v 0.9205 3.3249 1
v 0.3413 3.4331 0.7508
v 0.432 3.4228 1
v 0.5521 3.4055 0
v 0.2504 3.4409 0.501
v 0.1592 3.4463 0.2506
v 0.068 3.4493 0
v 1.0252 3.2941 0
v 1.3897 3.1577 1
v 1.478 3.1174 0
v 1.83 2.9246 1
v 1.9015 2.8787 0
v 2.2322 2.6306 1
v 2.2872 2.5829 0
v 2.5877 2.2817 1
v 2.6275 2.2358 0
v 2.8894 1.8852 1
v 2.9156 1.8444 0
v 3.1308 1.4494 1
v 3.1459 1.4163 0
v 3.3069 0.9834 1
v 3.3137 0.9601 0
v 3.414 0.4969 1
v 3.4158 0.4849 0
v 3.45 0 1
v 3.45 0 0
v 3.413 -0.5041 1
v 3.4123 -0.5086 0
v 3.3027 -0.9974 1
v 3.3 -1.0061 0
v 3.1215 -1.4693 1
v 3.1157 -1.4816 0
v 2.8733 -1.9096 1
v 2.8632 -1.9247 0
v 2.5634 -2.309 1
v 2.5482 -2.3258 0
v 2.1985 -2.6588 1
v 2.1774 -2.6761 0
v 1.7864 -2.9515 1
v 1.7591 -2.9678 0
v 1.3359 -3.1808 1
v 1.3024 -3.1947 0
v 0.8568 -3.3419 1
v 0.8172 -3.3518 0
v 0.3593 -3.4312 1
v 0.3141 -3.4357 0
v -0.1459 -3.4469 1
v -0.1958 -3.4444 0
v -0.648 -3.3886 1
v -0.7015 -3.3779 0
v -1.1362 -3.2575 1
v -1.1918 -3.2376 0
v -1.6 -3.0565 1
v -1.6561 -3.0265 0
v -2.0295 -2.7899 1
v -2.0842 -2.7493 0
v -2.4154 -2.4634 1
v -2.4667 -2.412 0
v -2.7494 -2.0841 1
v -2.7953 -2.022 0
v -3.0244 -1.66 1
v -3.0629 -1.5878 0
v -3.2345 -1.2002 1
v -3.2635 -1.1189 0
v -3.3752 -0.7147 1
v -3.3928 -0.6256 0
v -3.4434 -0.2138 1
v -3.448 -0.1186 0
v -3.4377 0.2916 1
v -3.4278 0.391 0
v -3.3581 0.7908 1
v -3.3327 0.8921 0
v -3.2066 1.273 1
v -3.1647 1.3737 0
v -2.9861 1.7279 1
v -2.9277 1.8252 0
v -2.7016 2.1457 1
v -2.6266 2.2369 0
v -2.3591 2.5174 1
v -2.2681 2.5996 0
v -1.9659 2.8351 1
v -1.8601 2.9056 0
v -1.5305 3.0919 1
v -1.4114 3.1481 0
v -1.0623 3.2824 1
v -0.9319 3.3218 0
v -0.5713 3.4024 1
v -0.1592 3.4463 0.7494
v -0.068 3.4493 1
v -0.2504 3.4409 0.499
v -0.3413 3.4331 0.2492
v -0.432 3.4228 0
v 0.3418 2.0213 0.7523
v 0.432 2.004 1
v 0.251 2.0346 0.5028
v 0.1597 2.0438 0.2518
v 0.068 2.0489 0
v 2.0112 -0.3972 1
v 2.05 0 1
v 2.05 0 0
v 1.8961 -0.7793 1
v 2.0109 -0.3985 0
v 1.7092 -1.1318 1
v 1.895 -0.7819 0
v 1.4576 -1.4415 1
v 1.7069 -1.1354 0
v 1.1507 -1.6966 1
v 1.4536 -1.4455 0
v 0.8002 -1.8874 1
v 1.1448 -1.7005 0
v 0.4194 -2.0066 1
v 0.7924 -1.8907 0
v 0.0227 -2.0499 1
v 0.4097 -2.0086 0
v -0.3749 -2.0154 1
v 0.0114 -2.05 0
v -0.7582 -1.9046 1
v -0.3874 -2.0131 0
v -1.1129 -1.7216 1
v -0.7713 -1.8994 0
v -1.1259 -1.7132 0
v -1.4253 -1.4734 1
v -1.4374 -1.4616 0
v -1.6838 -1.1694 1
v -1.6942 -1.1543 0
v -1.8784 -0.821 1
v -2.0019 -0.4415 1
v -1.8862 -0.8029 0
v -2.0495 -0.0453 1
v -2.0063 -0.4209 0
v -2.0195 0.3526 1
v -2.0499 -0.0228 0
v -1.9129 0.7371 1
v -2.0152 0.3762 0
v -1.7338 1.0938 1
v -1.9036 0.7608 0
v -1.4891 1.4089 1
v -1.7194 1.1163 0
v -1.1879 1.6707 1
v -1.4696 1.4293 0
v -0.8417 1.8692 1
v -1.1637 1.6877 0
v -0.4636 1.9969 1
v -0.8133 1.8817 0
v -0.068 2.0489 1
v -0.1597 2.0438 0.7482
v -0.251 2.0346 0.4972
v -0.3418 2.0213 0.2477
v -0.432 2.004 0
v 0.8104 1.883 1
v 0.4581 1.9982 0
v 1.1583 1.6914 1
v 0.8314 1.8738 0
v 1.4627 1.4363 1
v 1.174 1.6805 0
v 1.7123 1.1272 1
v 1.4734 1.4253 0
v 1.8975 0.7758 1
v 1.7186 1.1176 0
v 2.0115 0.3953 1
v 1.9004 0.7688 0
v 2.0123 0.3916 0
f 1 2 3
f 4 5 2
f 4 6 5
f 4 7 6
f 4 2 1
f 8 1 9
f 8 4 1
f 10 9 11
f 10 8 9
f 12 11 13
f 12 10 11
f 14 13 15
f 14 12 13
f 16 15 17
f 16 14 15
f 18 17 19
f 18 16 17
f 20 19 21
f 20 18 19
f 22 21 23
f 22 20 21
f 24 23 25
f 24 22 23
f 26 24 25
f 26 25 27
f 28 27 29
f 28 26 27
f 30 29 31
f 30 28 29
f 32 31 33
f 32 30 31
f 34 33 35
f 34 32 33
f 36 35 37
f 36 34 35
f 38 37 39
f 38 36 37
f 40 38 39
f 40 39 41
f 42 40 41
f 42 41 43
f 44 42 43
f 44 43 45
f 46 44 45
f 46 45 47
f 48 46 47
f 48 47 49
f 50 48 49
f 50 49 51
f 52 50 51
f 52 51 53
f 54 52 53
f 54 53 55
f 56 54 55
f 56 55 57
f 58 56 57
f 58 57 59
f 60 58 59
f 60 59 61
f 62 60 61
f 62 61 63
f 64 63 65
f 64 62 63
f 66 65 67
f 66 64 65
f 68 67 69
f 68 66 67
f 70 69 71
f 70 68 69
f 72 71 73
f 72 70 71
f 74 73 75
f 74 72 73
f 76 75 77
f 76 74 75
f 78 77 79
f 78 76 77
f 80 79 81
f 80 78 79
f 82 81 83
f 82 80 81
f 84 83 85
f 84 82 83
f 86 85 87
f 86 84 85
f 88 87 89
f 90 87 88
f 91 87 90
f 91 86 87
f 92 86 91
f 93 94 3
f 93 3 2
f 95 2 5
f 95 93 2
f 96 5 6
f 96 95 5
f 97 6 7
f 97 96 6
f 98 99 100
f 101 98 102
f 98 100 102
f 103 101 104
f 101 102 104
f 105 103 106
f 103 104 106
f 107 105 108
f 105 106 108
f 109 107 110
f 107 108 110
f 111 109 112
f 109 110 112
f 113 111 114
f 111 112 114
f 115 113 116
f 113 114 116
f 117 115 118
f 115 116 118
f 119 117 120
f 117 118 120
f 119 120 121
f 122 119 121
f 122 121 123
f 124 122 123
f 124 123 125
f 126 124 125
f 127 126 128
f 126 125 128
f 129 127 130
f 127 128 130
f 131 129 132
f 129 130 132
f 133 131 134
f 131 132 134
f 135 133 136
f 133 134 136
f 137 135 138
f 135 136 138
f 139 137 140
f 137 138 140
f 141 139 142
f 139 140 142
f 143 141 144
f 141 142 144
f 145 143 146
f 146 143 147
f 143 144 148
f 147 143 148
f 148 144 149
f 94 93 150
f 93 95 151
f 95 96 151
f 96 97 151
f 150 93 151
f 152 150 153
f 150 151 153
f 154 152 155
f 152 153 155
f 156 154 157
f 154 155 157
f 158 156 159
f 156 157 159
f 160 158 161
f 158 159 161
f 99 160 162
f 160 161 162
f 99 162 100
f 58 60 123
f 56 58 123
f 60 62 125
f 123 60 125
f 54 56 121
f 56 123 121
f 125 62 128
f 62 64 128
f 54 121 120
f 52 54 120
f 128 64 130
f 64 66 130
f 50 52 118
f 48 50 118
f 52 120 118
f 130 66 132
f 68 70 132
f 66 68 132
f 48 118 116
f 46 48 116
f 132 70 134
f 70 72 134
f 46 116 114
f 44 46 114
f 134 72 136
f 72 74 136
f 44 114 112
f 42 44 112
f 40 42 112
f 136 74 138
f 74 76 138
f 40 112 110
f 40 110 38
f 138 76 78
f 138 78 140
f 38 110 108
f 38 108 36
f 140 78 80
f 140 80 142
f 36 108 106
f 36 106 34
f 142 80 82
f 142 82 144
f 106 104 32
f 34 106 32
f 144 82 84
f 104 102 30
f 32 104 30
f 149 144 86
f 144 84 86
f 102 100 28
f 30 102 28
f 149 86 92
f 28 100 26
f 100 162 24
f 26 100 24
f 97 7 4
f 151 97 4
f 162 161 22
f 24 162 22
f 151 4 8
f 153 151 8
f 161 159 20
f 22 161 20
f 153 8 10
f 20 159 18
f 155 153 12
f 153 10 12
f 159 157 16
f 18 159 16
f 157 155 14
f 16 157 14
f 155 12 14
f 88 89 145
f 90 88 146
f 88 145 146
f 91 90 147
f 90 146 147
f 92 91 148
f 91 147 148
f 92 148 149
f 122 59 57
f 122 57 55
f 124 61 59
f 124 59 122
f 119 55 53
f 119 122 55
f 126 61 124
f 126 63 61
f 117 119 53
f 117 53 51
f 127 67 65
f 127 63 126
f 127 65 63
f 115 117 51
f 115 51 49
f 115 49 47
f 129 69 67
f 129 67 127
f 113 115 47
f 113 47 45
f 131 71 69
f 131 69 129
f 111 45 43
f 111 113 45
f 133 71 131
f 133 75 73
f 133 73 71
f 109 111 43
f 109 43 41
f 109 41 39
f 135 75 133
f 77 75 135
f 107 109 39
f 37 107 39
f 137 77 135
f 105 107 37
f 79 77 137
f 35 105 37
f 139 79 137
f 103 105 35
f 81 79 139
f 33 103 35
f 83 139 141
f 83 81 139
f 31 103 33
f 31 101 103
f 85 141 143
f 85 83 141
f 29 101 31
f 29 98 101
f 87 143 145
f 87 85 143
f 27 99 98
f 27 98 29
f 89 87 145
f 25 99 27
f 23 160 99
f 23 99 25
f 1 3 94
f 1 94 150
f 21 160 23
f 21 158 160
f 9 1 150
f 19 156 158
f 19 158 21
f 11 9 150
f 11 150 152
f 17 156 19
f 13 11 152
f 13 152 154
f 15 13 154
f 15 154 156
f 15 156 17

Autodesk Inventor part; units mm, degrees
ref_plane "XZ Plane" through (0, 0, 0) normal (0, 1, 0) x (-1, 0, 0)
ref_plane "XY Plane" through (0, 0, 0) normal (0, 0, 1) x (1, 0, 0)
sketch "Sketch1" plane through (0, 0, 0) normal (0, 0, 1) x (1, 0, 0)
  circle A0 centre (0, 0) radius 3.45
  circle A1 centre (0, 0) radius 2.05
  line L0 (-2.59, 0) -> (2.59, 0) construction
  line L1 (0, -2.59) -> (0, 2.59) construction
  dimension "d0" = 6.9
  dimension "d1" = 4.1
extrude "Выдавливание1" add sketch "Sketch1" along normal blind 1
sketch "Sketch2" plane through (0, 0, 0) normal (0, 1, 0) x (-1, 0, 0)
  line L0 (-2.05, 1) -> (2.05, 1) construction
  line L1 (2.05, 0) -> (-2.05, 0) construction
  line L2 (-0.432, 1) -> (-0.068, 0)
  line L3 (0.068, 1) -> (0.432, 0)
  line L4 (0, 0.5) -> (-0.182, 1) construction
  line L5 (0, 0) -> (0, 1) construction
  line L6 (-0.432, 1) -> (0.068, 1)
  line L7 (-0.068, 0) -> (0.432, 0)
  dimension "d4" = 70
  dimension "d13" = 0.5
extrude "Выдавливание2" cut sketch "Sketch2" along normal through all
ref_plane "Work Plane1" through (0, 0, 0) normal (1, 0, 0) x (0, 1, 0)
equation "\"d0\" = d + 2 * b"
equation "\"d1\" = d"
equation "\"d2\" = s_"
equation "\"d4\" = Angle"
equation "\"d13\" = 0.5 * s_"
equation "\"d7\" = s_"
equation "\"ND\" = 4"
equation "\"d\" = 4.1"
equation "\"b\" = 1.4"
equation "\"s_\" = 1"
equation "\"D_\" = 6.9"
equation "\"Angle\" = 70deg"
properties part number "Шайба У 4Л ГОСТ 6402-78" material "Сталь, мягкая"
